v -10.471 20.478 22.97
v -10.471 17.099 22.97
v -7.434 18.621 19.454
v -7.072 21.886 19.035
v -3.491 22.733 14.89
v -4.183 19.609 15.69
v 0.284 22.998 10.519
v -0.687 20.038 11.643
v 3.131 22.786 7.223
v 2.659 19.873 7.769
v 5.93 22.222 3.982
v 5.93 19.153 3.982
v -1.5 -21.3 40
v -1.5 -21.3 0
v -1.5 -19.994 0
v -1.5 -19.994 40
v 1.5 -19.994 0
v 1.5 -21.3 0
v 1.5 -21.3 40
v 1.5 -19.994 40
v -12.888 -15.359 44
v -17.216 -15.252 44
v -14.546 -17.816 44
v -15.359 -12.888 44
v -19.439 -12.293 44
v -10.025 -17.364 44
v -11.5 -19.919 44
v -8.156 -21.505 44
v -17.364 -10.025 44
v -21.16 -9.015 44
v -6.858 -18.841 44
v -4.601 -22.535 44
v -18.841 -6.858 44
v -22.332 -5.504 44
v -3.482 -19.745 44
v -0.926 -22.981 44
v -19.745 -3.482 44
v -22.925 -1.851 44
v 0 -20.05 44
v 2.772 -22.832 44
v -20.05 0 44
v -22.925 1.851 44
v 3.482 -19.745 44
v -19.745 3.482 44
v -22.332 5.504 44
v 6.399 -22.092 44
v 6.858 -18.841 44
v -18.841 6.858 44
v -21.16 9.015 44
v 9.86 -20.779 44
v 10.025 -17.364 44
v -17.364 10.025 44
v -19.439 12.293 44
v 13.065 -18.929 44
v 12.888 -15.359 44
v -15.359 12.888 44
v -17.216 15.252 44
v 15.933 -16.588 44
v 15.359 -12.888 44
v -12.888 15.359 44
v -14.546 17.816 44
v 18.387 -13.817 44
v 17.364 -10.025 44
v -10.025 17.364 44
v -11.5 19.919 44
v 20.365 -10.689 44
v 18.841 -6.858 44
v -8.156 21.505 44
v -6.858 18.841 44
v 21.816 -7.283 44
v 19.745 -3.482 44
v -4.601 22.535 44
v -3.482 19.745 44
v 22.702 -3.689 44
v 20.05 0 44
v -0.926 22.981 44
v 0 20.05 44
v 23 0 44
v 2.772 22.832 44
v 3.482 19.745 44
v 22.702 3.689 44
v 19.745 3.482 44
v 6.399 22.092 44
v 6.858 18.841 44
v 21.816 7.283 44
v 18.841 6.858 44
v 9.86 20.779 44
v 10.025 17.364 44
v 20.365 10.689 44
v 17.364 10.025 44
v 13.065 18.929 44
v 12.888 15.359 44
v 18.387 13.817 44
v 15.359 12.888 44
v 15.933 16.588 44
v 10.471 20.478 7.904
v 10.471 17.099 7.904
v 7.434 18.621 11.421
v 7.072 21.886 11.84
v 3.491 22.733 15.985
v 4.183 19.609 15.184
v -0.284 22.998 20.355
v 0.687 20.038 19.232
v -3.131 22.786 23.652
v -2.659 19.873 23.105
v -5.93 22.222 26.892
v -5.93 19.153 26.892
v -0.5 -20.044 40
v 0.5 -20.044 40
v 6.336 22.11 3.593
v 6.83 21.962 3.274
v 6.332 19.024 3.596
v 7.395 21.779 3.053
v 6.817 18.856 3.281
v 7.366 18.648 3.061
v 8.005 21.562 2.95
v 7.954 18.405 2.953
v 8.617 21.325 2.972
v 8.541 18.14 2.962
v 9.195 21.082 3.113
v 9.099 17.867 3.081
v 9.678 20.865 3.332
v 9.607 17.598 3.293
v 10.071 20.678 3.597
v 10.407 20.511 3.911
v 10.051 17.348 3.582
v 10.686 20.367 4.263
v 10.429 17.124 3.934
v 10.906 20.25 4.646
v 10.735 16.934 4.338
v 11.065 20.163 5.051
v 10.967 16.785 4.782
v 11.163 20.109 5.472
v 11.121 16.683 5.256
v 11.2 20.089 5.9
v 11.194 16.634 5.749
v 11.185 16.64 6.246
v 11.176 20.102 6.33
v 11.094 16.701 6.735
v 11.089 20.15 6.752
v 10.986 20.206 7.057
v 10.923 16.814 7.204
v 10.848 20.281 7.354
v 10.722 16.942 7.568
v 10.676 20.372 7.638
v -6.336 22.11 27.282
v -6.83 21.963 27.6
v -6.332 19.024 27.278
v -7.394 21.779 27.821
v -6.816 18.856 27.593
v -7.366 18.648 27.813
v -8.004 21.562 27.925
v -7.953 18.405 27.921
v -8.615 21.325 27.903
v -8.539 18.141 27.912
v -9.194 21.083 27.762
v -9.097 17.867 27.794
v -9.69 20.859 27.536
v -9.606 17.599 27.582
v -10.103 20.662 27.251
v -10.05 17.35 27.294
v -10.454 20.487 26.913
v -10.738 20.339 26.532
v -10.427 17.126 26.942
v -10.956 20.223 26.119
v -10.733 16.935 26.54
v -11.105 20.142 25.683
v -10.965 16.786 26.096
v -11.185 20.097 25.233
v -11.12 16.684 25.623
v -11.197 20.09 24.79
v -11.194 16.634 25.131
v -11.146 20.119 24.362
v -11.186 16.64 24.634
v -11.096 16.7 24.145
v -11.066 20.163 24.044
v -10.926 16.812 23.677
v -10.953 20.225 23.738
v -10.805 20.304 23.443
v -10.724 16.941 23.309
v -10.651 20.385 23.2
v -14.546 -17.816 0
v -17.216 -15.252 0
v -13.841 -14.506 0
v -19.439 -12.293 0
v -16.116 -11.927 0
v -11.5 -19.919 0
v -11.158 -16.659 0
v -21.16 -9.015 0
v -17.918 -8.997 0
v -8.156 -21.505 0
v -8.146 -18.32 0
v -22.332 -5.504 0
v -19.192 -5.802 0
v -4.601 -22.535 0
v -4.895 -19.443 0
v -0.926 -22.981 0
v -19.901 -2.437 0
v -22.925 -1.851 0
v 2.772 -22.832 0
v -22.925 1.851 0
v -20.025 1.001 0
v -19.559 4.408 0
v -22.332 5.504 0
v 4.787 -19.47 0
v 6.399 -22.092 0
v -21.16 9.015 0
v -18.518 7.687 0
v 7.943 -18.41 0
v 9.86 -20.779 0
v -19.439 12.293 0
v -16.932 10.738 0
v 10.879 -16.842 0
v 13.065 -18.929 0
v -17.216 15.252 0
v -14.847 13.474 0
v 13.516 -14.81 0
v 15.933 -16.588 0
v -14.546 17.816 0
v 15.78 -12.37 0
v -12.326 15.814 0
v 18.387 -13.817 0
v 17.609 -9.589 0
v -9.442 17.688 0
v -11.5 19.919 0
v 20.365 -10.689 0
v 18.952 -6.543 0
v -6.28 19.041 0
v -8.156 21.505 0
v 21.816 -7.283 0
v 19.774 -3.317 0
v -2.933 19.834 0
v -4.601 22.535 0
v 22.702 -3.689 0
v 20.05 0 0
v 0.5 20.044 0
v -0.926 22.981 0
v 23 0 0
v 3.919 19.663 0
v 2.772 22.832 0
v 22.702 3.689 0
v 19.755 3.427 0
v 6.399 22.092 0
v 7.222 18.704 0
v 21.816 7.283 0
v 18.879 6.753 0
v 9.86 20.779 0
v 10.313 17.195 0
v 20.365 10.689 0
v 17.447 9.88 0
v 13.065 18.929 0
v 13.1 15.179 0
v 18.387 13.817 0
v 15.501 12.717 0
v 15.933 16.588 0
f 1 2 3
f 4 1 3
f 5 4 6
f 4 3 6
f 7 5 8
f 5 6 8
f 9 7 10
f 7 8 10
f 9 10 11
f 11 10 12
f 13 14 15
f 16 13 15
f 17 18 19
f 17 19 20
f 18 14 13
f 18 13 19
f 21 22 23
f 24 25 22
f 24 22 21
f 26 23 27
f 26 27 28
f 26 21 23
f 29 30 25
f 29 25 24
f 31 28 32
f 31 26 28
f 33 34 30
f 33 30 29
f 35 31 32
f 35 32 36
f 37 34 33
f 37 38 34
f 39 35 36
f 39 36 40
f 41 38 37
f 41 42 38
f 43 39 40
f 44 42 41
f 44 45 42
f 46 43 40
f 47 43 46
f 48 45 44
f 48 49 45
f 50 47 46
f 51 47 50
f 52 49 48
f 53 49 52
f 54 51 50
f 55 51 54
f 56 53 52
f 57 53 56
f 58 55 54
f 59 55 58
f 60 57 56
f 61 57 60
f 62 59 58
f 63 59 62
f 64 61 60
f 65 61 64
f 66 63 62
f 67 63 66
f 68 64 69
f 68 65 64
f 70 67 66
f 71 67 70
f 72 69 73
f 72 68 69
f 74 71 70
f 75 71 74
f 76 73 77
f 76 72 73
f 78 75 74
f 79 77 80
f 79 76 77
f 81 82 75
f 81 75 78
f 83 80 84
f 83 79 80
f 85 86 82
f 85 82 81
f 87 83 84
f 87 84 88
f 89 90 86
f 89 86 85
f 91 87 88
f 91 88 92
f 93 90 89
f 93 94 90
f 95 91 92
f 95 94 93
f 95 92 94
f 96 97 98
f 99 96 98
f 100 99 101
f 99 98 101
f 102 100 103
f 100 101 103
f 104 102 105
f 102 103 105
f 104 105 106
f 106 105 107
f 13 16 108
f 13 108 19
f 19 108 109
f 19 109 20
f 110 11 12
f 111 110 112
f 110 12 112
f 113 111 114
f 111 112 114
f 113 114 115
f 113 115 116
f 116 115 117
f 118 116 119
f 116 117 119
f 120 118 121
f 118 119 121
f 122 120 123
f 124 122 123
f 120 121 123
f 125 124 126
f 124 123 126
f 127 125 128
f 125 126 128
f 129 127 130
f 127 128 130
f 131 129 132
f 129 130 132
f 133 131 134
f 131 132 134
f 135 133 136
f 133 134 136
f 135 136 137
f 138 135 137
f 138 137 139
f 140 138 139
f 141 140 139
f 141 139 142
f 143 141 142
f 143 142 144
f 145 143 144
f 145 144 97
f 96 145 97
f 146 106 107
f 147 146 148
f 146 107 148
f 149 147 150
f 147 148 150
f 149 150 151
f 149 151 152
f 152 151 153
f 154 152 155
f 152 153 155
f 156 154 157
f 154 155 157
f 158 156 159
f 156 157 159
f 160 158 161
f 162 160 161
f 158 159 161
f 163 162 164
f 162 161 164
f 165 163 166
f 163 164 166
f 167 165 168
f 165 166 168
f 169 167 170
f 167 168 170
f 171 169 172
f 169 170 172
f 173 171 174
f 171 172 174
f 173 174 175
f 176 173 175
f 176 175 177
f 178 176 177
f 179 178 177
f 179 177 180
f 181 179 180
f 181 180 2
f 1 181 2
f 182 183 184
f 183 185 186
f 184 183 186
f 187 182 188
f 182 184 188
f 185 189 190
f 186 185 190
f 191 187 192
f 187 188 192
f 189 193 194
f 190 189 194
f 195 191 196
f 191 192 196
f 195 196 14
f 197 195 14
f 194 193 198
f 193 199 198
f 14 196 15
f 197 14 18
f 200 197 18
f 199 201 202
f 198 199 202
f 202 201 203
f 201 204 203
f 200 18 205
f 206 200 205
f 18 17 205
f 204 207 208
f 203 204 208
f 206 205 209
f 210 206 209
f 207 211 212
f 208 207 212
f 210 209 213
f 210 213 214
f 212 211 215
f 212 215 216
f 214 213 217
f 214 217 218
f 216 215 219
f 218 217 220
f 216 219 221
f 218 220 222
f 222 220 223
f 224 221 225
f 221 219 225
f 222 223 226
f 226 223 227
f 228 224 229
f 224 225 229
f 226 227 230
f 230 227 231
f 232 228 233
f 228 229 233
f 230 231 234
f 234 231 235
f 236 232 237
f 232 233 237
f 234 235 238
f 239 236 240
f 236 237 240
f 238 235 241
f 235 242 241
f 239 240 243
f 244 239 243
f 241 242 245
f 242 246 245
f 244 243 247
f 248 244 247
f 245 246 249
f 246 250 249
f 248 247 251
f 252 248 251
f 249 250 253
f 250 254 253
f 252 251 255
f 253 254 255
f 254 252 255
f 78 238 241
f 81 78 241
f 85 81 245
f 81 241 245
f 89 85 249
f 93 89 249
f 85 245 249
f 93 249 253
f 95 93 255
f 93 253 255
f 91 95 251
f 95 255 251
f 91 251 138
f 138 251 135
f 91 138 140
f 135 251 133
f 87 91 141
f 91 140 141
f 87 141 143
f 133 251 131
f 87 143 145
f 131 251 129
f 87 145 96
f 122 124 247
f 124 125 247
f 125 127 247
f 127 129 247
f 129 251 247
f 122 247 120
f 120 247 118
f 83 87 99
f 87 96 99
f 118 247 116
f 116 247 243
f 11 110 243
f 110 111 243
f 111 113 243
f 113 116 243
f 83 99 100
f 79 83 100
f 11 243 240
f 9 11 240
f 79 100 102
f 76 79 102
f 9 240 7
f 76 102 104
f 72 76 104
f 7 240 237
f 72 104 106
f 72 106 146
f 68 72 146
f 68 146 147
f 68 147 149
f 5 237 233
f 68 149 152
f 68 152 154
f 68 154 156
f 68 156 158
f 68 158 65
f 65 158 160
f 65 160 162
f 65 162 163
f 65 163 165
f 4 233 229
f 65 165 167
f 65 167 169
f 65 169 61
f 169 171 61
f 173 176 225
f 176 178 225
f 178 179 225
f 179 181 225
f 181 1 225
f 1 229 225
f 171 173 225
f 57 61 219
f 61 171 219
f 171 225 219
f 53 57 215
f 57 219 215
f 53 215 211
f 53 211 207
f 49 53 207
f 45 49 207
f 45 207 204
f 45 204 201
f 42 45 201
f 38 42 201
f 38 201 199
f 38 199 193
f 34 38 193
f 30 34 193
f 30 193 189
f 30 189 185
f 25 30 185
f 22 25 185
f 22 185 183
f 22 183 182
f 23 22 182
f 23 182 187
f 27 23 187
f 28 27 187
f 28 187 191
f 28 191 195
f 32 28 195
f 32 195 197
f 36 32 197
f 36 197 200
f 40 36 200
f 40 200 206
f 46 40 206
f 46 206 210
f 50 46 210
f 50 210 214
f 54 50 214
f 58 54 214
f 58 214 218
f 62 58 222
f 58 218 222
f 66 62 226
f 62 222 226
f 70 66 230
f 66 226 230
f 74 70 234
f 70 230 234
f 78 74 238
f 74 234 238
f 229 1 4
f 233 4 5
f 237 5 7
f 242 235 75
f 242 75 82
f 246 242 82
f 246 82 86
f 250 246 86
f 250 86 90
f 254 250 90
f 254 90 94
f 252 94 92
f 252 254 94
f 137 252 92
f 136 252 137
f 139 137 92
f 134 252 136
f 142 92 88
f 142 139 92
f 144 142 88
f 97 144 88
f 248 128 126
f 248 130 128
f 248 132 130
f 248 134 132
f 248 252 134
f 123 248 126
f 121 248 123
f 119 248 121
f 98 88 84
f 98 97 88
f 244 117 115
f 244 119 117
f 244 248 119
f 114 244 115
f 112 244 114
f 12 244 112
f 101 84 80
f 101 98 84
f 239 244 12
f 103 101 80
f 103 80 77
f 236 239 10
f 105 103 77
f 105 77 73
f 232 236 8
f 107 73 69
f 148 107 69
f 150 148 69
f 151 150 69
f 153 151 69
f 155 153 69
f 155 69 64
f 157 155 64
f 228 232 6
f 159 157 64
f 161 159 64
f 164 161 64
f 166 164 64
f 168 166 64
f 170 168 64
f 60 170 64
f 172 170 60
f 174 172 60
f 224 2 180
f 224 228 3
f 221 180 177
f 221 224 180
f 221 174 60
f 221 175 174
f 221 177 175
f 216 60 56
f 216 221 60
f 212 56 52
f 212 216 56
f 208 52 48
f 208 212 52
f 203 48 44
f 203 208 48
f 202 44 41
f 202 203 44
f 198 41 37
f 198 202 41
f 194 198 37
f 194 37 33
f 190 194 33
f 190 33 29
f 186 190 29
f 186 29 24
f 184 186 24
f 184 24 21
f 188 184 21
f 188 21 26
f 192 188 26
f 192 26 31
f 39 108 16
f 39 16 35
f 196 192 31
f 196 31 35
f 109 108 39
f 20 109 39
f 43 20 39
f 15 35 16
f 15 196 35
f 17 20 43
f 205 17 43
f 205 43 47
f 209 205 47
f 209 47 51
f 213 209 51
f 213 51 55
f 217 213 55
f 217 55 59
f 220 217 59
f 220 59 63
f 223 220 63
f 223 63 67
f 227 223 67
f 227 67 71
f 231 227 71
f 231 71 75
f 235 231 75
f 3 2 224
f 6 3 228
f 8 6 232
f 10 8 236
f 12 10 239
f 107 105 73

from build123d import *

# Parameters (mm, degrees)
SKETCH_1_R          = 23
SKETCH_1_R_2        = 20.05
EXTRUDE_1_DEPTH     = 44
CUT_EXTRUDE_1_DEPTH = 40
SKETCH_3_W          = 3
SKETCH_3_H          = 2.5
CUT_EXTRUDE_2_DEPTH = 40


with BuildPart() as part:
    # 스케치1 → 보스-돌출1 (new body)
    with BuildSketch(Plane.XY):
        Circle(SKETCH_1_R)
        Circle(SKETCH_1_R_2, mode=Mode.SUBTRACT)
    extrude(amount=EXTRUDE_1_DEPTH)

    # 스케치2 → 컷-돌출1 (cut)
    with BuildSketch(Plane(origin=(0, 0, 0), x_dir=(1, 0, 0), z_dir=(0, 1, 0))):
        with BuildLine():
            Line((-10.470977563, -22.970475817), (5.930302333, -3.982092632))
            ThreePointArc((5.930302333, -3.982092632), (10.161651705, -3.672766774), (10.470977563, -7.904116147))
            Line((10.470977563, -7.904116147), (-5.930302333, -26.892499333))
            ThreePointArc((-5.930302333, -26.892499333), (-10.161651705, -27.20182519), (-10.470977563, -22.970475817))
        make_face()
    extrude(amount=CUT_EXTRUDE_1_DEPTH, mode=Mode.SUBTRACT)

    # 스케치3 → 컷-돌출2 (cut)
    with BuildSketch(Plane.XY):
        with Locations((0, -20.05)):
            Rectangle(SKETCH_3_W, SKETCH_3_H)
    extrude(amount=CUT_EXTRUDE_2_DEPTH, mode=Mode.SUBTRACT)


solid = part.part
